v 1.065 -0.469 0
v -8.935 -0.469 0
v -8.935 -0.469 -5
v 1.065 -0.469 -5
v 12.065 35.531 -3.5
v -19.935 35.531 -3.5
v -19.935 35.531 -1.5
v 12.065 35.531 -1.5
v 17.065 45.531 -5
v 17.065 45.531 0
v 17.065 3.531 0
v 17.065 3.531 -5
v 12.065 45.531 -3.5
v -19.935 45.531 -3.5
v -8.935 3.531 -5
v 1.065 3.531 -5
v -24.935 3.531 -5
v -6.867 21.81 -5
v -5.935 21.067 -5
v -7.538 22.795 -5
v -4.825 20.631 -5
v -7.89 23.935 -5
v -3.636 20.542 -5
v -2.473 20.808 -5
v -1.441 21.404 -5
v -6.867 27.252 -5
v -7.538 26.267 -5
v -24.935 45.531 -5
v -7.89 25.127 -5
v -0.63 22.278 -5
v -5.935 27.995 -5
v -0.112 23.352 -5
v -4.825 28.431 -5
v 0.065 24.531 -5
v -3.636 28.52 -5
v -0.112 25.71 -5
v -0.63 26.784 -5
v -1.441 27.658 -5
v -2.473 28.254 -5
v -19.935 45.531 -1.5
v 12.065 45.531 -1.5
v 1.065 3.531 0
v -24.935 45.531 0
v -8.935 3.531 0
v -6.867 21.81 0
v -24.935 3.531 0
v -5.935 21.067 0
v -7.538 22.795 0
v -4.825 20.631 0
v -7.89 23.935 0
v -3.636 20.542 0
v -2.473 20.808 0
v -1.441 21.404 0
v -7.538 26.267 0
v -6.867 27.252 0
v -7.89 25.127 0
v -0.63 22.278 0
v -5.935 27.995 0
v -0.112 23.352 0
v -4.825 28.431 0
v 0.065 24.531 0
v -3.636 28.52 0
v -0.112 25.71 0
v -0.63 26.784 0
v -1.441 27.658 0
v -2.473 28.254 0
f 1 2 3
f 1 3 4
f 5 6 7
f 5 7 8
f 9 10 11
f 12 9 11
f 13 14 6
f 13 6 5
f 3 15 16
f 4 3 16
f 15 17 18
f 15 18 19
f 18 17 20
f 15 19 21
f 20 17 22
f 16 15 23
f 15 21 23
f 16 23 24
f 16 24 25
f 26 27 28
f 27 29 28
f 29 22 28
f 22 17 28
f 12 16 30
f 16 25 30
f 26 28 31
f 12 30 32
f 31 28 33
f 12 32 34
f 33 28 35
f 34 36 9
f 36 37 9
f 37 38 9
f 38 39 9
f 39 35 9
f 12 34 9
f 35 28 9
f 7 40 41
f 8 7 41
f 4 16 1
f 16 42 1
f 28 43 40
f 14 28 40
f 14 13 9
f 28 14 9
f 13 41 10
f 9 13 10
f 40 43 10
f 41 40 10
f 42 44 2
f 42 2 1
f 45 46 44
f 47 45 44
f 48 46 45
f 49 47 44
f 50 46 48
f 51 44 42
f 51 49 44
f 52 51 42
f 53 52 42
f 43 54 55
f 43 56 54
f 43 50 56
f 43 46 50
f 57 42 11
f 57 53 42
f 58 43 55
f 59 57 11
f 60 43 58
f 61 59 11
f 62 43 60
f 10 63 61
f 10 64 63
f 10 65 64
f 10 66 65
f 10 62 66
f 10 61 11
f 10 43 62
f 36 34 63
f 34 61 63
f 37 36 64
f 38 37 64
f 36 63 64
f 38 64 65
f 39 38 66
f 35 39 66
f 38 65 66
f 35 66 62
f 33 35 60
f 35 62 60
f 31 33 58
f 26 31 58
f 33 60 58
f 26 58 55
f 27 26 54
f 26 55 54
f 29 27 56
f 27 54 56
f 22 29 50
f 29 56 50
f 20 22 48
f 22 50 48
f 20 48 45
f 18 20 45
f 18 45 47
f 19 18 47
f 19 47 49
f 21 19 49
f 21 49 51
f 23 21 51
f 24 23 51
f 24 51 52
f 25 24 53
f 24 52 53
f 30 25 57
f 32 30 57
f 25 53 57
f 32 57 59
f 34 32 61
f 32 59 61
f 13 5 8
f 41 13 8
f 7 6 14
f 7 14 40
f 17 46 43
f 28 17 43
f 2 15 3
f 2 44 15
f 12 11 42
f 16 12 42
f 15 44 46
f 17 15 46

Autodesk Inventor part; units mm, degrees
ref_plane "YZ Plane" through (0, 0, 0) normal (1, 0, 0) x (0, 1, 0)
ref_plane "XZ Plane" through (0, 0, 0) normal (0, 1, 0) x (-1, 0, 0)
ref_plane "XY Plane" through (0, 0, 0) normal (0, 0, 1) x (1, 0, 0)
sketch "Sketch1" plane through (0, 0, 0) normal (0, 0, 1) x (1, 0, 0)
  line L0 (-8.9346, 3.531) -> (-24.9346, 3.531)
  line L1 (-24.9346, 3.531) -> (-24.9346, 45.531)
  line L2 (-24.9346, 45.531) -> (17.0654, 45.531)
  line L3 (17.0654, 45.531) -> (17.0654, 3.531)
  line L4 (17.0654, 3.531) -> (1.0654, 3.531)
  line L5 (-8.9346, -0.469) -> (1.0654, -0.469)
  line L6 (-8.9346, 3.531) -> (-8.9346, -0.469)
  line L7 (1.0654, 3.531) -> (1.0654, -0.469)
  circle A0 centre (-3.9346, 24.531) radius 4
  point P0 (0, 0)
extrude "Extrusion4" add sketch "Sketch1" against normal blind 5
sketch "Sketch3" plane through (-24.9346, 45.531, 0) normal (0, 1, 0) x (1, 0, 0)
  line L0 (0, 0) -> (0, 5) projected
  line L1 (16, 5) -> (0, 5) projected
  line L2 (5, 3.5) -> (5, 1.5)
  line L3 (0, 0) -> (16, 0) projected
  line L4 (5, 3.5) -> (37, 3.5)
  line L5 (5, 1.5) -> (37, 1.5)
  line L6 (37, 3.5) -> (37, 1.5)
  point P0 (24.9346, 0)
extrude "Extrusion6" cut sketch "Sketch3" against normal blind 10
properties part number "suport cu rulment pentru tija" material "Gold"
